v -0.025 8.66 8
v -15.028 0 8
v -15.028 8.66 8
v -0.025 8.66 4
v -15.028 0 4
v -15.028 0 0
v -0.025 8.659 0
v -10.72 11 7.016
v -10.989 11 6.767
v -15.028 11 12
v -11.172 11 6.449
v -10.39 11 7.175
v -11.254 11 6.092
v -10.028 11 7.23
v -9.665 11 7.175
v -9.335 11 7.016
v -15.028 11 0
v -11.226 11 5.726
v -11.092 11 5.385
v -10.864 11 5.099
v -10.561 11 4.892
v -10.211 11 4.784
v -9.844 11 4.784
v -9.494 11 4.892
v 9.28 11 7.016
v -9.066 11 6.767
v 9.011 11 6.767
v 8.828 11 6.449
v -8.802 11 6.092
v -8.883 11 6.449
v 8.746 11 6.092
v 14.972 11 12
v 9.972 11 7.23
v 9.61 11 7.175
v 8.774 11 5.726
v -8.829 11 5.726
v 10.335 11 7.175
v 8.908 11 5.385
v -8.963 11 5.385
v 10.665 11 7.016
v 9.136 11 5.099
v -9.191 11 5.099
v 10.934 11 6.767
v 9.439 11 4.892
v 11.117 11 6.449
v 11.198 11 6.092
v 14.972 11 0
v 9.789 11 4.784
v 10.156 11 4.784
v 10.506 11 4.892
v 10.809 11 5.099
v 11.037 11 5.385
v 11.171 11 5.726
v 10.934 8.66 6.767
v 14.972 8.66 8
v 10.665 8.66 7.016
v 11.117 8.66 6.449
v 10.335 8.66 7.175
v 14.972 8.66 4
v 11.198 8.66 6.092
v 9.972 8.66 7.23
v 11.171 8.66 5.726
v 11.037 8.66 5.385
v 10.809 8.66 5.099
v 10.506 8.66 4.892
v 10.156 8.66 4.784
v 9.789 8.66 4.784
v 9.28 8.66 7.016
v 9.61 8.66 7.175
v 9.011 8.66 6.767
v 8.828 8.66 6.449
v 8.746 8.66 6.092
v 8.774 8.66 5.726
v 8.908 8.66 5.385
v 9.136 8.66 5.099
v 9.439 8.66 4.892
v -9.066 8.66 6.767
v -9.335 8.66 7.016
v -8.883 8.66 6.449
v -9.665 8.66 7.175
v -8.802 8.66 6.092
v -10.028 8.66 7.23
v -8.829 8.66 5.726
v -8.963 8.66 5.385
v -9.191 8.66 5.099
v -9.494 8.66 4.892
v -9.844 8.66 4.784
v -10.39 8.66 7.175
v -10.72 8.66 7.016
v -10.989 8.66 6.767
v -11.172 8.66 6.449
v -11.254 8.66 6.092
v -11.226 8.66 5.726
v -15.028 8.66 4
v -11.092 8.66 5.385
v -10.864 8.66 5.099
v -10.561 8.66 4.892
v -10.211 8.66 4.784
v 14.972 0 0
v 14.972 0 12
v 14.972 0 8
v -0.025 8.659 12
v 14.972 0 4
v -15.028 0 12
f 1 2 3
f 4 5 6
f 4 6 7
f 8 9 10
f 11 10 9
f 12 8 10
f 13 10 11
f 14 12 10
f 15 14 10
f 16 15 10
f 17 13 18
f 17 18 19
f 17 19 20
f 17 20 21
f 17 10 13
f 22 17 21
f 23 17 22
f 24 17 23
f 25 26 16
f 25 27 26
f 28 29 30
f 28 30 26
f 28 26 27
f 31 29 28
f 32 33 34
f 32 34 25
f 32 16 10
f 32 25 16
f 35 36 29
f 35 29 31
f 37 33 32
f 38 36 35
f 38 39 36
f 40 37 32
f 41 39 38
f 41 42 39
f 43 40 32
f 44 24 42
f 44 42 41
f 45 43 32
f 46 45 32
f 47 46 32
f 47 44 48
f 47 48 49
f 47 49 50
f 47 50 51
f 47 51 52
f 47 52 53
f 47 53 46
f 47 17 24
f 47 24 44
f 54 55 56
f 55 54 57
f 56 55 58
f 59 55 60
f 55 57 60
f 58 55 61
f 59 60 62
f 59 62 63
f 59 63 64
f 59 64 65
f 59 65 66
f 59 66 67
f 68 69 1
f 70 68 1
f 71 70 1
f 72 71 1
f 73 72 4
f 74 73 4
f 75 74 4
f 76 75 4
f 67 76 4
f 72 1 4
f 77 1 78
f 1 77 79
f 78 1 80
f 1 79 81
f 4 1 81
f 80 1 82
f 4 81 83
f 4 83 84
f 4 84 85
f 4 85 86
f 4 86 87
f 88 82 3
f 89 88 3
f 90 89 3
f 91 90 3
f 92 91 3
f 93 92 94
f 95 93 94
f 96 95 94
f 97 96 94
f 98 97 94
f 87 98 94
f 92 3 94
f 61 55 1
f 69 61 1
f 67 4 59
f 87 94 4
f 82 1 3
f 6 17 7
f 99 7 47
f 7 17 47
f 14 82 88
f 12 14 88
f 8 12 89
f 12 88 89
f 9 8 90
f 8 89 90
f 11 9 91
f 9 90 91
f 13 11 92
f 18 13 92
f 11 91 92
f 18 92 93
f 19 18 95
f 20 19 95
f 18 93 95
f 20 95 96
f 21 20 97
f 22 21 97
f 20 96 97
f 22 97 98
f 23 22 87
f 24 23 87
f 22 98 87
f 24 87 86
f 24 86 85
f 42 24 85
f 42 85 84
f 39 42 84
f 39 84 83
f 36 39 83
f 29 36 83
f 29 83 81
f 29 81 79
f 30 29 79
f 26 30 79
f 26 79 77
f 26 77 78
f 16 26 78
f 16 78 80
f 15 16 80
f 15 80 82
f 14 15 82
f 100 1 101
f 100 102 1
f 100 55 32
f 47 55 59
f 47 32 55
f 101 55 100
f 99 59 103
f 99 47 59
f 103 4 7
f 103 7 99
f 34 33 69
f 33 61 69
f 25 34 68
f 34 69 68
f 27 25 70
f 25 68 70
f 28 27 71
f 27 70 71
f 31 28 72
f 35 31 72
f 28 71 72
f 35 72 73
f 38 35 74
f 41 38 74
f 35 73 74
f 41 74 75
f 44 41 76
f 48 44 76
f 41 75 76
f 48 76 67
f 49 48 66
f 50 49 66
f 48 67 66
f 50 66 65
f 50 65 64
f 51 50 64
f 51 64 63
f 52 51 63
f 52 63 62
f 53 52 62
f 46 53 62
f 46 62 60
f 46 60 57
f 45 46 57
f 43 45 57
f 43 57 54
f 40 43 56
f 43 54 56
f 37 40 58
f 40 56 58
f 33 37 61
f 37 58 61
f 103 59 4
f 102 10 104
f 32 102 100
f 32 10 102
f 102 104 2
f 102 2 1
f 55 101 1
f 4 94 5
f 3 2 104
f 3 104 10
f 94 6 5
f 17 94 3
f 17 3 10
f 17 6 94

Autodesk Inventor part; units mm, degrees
ref_plane "YZ Plane" through (0, 0, 0) normal (1, 0, 0) x (0, 1, 0)
ref_plane "XZ Plane" through (0, 0, 0) normal (0, 1, 0) x (-1, 0, 0)
ref_plane "XY Plane" through (0, 0, 0) normal (0, 0, 1) x (1, 0, 0)
sketch "Szkic1" plane through (0, 0, 0) normal (0, 0, 1) x (1, 0, 0)
  line L0 (-15.0276, 11) -> (14.9724, 11)
  line L1 (14.9724, 11) -> (14.9724, 0)
  line L2 (14.9724, 0) -> (-15.0276, 0)
  line L3 (-15.0276, 0) -> (-15.0276, 11)
  point P0 (0, 0)
  dimension "d0" = 30
  dimension "d1" = 11
extrude "Wyciągnięcie proste1" add sketch "Szkic1" along normal blind 12
sketch "Szkic2" plane through (0, 0, 12) normal (0, 0, 1) x (1, 0, 0)
  line L0 (14.9724, 11) -> (-15.0276, 11) projected
  line L1 (-0.0276, 11) -> (0, 0)
  line L2 (-15.0276, 11) -> (-15.0276, 0) projected
  line L3 (-15.0276, 0) -> (14.9724, 0) projected
  line L4 (-15.0276, 8.66) -> (14.9724, 8.66)
  line L5 (14.9724, 0) -> (14.9724, 11) projected
  line L6 (-15.0276, 0) -> (-0.0276, 8.66)
  line L7 (-0.0276, 8.66) -> (14.9724, 0)
  line L8 (14.9724, 0) -> (-15.0276, 0)
  dimension "d4" = 8.66
extrude "Wyciągnięcie proste2" cut sketch "Szkic2" against normal blind 12 contours L7 L3 L1 | L1 L3 L6
sketch "Szkic3" plane through (-15.0276, 11, 0) normal (-1, 0, 0) x (0, 0, 1)
  line L0 (12, -2.34) -> (0, -2.34) projected
  line L1 (0, 0) -> (12, 0) projected
  line L2 (6, 0) -> (6, -11)
  line L3 (0, -11) -> (12, -11) projected
  line L4 (8, -2.34) -> (4, -2.34)
  line L5 (4, -2.34) -> (4, -11)
  line L6 (4, -11) -> (8, -11)
  line L7 (8, -11) -> (8, -2.34)
  point P0 (4, -2.34)
  dimension "d7" = 4
extrude "Wyciągnięcie proste3" cut sketch "Szkic3" against normal blind 30
sketch "Szkic4" plane through (-15.0276, 11, 0) normal (0, 1, 0) x (1, 0, 0)
  line L0 (0, 0) -> (0, -12) projected
  line L1 (0, -6) -> (30, -6)
  line L2 (30, 0) -> (30, -12) projected
  line L3 (30, -12) -> (0, -12) projected
  line L4 (25, -12) -> (25, 0)
  line L5 (30, 0) -> (15, 0) projected
  line L6 (15, -12) -> (15, -8) projected
  line L7 (15, 0) -> (15, -12)
  line L8 (5, -12) -> (5, 0)
  point P0 (15.0276, 0)
  point P1 (5, -6)
  point P2 (25, -6)
  dimension "d10" = 5
hole "Otwór1" at (-10.0276, 11, 6) at (9.9724, 11, 6) direction (0, -1, 0) diameter 2.459 depth 8.8 tip angle 118 thread size "M3x0.5" class "6H" standard "ISO Metric profile"
properties part number "szczęka" material "Stal nierdzewna 440C"
